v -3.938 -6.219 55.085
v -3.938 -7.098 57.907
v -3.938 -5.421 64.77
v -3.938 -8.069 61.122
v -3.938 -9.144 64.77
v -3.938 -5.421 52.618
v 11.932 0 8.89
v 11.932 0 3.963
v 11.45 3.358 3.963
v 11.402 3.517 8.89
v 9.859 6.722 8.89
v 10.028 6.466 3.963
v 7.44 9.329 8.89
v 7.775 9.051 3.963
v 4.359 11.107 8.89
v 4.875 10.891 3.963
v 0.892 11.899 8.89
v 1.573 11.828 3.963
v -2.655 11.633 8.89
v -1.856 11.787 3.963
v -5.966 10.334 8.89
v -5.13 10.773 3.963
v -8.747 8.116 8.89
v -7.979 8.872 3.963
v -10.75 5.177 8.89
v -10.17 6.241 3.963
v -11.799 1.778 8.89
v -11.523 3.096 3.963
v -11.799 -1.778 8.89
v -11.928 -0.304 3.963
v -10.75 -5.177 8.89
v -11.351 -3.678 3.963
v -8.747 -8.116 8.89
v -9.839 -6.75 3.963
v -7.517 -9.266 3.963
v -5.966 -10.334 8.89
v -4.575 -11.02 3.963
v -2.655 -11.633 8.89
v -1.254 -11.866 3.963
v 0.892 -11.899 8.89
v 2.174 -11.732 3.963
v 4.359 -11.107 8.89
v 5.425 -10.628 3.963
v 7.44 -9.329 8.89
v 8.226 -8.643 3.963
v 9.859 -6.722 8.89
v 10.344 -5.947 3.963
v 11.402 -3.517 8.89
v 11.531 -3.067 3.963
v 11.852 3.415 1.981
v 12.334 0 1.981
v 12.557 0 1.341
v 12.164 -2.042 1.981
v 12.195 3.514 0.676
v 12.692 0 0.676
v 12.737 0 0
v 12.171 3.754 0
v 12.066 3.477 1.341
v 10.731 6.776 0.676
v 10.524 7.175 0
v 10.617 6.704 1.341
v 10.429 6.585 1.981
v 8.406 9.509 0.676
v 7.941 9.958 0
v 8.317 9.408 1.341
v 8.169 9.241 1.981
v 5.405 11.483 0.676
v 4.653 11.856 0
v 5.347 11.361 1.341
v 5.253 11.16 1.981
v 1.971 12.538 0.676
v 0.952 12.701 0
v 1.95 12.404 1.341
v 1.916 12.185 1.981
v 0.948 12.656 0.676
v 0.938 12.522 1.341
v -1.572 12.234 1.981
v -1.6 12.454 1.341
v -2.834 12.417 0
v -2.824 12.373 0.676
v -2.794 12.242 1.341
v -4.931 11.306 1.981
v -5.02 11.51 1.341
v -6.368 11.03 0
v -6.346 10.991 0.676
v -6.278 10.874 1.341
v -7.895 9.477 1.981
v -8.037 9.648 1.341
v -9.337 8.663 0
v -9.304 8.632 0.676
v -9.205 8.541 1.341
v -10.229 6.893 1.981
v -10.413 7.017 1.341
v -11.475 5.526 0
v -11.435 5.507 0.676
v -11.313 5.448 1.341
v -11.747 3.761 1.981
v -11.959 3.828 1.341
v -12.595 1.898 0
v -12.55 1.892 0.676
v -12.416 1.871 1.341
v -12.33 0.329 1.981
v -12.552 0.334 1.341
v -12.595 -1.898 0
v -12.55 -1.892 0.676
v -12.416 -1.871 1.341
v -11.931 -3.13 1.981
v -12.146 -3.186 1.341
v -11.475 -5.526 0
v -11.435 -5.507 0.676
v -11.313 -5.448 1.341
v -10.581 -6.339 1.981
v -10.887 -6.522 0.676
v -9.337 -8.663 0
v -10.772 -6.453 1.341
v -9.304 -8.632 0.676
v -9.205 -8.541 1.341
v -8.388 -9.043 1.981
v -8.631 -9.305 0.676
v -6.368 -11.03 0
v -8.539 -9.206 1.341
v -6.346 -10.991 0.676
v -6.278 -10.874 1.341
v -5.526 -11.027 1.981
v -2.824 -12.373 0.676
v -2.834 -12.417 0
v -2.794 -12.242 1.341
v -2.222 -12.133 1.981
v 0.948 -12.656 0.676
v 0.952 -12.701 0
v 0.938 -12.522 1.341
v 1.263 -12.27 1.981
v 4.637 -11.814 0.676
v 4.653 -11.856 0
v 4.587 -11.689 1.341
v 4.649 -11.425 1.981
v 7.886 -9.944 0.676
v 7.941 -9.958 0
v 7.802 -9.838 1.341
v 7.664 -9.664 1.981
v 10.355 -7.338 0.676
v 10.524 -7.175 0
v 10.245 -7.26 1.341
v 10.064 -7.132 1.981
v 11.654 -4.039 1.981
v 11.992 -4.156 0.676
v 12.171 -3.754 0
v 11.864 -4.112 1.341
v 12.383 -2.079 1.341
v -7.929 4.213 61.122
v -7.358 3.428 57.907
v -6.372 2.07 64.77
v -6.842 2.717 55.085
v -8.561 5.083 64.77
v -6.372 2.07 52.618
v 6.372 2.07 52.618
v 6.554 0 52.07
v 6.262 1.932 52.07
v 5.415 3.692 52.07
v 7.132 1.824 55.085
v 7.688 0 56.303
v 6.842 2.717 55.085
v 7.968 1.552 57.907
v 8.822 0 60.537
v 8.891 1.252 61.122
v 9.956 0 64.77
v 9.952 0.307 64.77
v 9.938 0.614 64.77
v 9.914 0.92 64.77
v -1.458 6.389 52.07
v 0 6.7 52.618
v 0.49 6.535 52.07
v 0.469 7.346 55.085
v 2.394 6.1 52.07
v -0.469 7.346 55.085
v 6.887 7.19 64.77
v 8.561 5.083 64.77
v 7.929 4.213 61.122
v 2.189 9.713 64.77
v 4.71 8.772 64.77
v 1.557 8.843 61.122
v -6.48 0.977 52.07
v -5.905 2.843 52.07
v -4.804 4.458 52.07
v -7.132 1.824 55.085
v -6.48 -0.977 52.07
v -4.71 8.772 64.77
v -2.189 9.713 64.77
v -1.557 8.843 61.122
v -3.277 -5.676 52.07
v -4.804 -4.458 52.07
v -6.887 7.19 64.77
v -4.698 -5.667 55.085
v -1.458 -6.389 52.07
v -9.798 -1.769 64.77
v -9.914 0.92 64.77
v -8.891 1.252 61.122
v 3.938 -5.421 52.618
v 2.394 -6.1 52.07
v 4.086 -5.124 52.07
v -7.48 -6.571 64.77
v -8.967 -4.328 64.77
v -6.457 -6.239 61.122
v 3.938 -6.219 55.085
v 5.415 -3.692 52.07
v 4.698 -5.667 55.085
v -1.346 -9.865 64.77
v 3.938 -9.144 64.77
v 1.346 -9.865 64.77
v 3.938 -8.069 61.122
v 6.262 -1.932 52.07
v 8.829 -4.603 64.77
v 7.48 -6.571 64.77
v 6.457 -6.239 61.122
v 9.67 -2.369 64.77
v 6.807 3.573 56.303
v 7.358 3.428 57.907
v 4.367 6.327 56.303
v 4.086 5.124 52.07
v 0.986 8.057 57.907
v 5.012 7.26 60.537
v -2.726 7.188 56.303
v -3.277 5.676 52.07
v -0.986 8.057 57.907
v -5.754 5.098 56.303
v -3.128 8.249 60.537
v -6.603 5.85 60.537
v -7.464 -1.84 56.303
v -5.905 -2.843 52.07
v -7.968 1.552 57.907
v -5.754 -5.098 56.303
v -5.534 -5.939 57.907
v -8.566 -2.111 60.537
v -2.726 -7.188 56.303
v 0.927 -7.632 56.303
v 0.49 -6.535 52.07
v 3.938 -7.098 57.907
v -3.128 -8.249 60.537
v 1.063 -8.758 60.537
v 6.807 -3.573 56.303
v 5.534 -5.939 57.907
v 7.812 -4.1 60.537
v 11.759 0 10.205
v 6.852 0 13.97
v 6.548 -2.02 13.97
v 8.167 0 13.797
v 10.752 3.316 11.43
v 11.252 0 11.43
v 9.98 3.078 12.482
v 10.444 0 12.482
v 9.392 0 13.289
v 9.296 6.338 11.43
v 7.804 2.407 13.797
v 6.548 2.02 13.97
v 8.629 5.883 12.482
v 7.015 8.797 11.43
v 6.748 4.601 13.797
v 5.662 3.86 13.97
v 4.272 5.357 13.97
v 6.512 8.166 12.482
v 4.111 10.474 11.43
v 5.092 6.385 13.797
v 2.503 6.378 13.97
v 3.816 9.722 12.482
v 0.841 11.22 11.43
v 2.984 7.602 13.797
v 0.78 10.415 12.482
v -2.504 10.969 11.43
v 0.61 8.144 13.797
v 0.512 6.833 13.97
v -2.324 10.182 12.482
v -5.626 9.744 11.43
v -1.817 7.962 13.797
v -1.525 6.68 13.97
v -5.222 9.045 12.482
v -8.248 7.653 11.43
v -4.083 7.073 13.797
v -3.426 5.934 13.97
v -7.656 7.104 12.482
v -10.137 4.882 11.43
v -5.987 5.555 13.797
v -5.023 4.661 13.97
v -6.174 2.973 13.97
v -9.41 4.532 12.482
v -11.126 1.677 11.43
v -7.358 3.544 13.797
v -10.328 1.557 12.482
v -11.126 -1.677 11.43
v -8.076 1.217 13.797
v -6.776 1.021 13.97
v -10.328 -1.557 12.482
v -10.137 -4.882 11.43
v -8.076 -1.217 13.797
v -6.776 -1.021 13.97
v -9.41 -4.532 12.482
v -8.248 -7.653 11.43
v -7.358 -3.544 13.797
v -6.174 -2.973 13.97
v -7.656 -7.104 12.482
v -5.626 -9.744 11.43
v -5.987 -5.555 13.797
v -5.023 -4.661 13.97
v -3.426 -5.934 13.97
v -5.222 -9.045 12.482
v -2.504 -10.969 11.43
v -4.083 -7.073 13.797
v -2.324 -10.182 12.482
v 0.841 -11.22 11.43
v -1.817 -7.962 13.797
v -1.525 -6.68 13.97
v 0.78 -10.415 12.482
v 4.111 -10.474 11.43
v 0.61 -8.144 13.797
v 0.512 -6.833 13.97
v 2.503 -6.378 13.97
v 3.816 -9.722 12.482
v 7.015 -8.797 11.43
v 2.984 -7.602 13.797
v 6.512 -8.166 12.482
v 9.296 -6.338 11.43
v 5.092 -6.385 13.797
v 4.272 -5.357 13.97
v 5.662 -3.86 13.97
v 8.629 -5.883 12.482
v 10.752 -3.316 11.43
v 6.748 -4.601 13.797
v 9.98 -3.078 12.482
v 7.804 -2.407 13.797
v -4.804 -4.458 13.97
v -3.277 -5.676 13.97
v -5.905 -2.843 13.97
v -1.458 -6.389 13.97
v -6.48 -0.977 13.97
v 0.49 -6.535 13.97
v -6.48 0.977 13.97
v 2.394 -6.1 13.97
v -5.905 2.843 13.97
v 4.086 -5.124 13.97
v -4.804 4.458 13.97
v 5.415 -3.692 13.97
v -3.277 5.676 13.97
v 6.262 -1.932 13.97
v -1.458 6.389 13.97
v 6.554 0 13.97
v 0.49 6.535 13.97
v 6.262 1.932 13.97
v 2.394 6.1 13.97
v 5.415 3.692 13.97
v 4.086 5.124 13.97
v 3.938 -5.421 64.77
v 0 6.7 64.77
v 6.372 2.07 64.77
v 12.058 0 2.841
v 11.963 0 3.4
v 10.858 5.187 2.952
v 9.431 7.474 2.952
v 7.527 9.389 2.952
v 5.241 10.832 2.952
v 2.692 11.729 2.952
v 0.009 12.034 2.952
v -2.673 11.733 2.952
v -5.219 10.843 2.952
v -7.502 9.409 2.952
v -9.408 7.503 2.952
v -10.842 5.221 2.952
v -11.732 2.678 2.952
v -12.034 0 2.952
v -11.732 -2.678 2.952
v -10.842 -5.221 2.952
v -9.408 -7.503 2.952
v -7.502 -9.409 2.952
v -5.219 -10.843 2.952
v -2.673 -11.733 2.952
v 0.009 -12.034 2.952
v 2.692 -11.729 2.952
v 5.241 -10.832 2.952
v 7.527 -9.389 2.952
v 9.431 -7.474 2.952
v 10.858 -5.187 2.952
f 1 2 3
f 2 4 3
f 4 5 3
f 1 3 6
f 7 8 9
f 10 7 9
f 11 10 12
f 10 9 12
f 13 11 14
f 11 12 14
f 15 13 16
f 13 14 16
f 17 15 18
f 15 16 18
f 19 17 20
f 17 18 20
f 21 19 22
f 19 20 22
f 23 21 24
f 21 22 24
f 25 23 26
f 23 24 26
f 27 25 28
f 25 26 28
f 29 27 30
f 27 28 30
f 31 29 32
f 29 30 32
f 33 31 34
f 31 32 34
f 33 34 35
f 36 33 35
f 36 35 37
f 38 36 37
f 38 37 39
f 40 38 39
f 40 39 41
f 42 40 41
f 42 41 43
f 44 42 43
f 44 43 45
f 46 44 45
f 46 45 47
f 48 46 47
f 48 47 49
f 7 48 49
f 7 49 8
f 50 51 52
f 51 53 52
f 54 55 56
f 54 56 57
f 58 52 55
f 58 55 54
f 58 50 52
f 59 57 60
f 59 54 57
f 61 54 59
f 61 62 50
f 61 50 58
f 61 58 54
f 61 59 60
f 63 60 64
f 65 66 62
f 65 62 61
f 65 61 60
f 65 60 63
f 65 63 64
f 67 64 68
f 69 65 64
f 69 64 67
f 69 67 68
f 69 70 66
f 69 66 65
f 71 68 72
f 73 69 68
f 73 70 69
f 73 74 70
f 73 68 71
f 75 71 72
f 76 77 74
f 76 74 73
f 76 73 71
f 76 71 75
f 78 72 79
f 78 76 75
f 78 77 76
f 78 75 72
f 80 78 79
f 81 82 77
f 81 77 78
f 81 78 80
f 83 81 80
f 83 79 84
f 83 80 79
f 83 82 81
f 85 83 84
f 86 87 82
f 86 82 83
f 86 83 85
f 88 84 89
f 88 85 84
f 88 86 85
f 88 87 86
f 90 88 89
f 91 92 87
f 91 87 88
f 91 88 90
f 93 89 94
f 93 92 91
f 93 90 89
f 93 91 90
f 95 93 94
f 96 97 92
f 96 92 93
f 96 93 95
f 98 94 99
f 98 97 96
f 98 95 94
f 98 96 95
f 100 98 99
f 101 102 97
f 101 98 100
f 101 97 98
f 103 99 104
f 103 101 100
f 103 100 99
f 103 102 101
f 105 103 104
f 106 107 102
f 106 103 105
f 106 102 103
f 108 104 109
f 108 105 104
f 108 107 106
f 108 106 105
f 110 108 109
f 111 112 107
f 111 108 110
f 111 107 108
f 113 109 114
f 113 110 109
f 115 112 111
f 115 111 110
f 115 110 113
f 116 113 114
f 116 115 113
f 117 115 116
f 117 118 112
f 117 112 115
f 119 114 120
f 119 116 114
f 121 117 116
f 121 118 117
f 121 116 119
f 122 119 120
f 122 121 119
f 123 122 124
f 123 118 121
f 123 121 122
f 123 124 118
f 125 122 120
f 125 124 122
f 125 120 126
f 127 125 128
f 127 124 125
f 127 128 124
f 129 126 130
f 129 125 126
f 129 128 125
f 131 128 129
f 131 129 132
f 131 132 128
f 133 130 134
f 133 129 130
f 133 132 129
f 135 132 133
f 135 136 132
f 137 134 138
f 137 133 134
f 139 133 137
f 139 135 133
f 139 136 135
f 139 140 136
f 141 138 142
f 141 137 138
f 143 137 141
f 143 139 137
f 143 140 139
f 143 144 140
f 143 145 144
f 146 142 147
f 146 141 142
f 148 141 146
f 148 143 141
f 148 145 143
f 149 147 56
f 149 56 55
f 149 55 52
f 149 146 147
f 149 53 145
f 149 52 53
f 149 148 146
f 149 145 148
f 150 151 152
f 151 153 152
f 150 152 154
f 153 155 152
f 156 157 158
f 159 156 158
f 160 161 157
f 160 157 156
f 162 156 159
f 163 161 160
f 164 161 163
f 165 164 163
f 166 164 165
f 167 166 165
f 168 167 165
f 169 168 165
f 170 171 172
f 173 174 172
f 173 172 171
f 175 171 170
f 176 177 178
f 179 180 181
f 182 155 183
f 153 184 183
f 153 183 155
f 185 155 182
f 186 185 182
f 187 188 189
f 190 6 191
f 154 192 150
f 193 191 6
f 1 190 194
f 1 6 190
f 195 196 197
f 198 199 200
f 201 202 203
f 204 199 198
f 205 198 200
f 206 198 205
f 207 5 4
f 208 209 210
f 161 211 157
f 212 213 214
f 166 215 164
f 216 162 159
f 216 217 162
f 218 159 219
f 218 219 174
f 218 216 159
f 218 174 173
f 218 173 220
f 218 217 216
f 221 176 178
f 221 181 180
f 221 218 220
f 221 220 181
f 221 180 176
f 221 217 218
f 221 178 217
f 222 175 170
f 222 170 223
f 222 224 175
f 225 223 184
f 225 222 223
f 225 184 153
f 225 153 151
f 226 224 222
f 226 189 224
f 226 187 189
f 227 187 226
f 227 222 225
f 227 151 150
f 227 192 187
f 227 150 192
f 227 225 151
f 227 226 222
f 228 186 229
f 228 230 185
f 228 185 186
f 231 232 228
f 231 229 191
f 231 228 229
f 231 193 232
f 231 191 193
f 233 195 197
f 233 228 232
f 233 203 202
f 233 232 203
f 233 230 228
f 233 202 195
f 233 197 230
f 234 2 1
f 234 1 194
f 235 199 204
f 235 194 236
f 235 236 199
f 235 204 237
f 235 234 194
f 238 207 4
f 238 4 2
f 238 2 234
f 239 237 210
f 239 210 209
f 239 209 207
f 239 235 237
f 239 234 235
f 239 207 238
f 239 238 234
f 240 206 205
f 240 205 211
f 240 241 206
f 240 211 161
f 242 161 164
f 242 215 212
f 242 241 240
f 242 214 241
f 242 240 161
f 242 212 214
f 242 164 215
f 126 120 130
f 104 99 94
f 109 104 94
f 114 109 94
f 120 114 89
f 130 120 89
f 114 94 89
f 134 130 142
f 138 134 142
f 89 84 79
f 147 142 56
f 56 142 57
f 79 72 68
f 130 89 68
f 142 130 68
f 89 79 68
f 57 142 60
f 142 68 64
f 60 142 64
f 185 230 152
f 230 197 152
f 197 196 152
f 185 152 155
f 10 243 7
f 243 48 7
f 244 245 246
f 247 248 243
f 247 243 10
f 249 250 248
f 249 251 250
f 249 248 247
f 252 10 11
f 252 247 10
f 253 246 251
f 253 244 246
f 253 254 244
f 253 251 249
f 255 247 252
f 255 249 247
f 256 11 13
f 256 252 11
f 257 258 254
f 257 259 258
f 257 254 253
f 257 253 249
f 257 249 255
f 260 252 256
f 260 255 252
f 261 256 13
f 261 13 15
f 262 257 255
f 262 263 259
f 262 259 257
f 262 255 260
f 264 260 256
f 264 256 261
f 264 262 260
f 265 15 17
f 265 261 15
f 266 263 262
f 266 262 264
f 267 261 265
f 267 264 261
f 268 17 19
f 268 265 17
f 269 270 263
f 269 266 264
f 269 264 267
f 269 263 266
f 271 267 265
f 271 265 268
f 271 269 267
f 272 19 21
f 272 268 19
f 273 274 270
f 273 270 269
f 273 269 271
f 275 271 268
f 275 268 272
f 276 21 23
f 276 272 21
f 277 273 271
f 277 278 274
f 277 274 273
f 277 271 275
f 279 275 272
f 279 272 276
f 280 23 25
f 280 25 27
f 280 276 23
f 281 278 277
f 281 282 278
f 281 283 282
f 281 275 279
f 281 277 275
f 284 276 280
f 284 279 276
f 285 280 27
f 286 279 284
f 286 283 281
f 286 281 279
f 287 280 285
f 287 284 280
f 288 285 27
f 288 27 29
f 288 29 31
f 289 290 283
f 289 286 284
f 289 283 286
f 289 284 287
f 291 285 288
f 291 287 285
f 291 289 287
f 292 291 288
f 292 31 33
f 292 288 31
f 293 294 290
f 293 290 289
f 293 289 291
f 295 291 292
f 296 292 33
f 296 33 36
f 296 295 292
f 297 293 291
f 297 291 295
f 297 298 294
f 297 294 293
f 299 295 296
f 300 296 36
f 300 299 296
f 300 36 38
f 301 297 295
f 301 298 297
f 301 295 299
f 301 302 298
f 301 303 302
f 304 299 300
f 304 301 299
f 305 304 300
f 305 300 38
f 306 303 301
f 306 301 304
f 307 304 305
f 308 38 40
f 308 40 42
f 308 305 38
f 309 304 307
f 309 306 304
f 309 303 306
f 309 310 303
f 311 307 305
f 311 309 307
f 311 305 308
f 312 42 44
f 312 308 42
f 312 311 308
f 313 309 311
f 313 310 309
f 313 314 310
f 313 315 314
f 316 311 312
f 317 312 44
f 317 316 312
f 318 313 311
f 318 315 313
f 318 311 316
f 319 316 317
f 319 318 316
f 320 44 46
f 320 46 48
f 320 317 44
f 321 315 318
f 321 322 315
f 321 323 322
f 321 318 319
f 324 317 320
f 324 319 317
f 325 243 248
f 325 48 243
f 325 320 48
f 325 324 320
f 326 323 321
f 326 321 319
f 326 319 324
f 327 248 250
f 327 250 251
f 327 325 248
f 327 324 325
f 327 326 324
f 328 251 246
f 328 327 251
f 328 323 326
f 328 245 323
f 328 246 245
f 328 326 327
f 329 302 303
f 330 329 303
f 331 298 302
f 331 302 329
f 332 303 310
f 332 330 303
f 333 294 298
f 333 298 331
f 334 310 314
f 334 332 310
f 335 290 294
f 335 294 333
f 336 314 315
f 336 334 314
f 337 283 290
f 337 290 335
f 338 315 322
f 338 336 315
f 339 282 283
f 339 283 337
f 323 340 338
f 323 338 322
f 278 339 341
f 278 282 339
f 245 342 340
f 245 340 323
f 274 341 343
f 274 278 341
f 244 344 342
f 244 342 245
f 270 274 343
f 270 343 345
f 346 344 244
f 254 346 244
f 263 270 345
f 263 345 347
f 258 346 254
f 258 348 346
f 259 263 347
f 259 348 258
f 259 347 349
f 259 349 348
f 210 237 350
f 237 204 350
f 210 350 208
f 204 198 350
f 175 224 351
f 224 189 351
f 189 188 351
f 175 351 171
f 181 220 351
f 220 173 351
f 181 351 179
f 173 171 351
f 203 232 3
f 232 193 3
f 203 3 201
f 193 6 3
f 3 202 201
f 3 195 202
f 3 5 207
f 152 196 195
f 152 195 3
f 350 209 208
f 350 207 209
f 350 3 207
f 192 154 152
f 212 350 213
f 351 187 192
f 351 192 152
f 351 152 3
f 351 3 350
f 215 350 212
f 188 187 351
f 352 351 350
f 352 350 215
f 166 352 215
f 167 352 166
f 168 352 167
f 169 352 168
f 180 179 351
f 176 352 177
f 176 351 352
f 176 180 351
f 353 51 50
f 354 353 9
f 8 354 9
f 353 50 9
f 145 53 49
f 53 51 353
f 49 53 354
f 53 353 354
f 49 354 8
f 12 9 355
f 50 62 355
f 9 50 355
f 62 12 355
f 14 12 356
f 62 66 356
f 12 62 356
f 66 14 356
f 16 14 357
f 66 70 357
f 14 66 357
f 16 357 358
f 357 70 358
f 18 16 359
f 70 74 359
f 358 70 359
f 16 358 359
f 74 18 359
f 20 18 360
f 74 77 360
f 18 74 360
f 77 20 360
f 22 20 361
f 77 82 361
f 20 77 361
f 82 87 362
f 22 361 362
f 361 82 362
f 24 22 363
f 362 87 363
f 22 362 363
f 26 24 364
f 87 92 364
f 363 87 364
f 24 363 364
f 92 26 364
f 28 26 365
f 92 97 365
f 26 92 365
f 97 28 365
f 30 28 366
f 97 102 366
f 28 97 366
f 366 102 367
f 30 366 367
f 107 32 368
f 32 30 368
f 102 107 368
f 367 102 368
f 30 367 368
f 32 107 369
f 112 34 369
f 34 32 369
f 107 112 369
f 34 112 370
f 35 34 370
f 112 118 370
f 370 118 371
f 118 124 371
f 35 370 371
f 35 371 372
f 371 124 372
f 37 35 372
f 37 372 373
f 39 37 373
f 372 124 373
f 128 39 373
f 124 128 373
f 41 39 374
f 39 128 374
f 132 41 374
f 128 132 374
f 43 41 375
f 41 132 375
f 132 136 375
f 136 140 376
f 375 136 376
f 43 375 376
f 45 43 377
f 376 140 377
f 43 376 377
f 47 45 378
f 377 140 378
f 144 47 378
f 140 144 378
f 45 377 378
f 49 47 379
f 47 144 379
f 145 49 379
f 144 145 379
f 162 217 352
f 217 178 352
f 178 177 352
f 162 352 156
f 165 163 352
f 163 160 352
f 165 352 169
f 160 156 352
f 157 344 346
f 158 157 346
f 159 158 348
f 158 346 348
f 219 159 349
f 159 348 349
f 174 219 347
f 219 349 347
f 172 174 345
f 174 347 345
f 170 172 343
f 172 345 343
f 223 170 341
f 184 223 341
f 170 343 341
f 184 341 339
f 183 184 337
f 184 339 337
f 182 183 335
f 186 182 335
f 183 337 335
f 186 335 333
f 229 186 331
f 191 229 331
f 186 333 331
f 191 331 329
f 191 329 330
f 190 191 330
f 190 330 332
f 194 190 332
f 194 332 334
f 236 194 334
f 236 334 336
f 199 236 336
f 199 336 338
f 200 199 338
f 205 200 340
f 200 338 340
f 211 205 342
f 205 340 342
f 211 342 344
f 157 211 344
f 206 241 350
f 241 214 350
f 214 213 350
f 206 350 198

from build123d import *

# Parameters (mm, degrees)
F0_R      = 12.7368274584
F1_DEPTH  = 5.08
F2_R      = 5.07999
F3_R      = 11.9321398377
F4_DEPTH  = 13.97
F5_R      = 5.08
F6_R      = 6.5535099449
F7_DEPTH  = 24.13
F8_DEPTH  = 27.94
F8_FACE_R = 6.5535099449
F9_DEPTH  = 12.7
F9_TAPER  = -15
F11_DEPTH = 25.4


# Not quite as in the source:
# - a fillet or chamfer is up to 0.001 mm smaller than in the source, because OpenCascade refuses the exact size


with BuildPart() as f1:
    # F0 (on Top) → F1 (new body)
    with BuildSketch(Plane.XY):
        Circle(F0_R)
    extrude(amount=F1_DEPTH)

    # F2 (radius 5.08 in the source; OpenCascade refuses exactly that, so slightly less here)
    f2_edges = [f1.edges().sort_by_distance(p)[0] for p in [
        (-12.736827, 0, 5.08),
    ]]
    fillet(f2_edges, radius=F2_R)

    # F3 (on Top) → F4 (join)
    with BuildSketch(Plane.XY):
        Circle(F3_R)
    extrude(amount=F4_DEPTH)

    # F5
    f5_edges = [f1.edges().sort_by_distance(p)[0] for p in [
        (-11.93214, 0, 2.743746),
        (11.93214, 0, 8.356873),
        (-11.93214, 0, 13.97),
    ]]
    fillet(f5_edges, radius=F5_R)

    # F6 (on Top) → F7 (join)
    with BuildSketch(Plane.XY):
        Circle(F6_R)
    extrude(amount=F7_DEPTH)

    # F8 (add): a face of the model
    f8_faces = [f1.faces().sort_by_distance(p)[0] for p in [
        (0, 0, 24.13),
    ]]
    extrude(f8_faces, amount=F8_DEPTH)

    # F8_face (on face) → F9 (join)
    with BuildSketch(Plane.XY.offset(52.07)):
        Circle(F8_FACE_R)
    extrude(amount=F9_DEPTH, taper=F9_TAPER)

    # F10 (on face) → F11 (cut)
    with BuildSketch(Plane.XY.offset(64.77)):
        with BuildLine():
            Line((3.9382930845, -5.420595399), (3.9382930845, -9.1444538754))
            ThreePointArc((3.9382930845, -9.1444538754), (5.852263109, -8.0549491371), (7.4798929542, -6.5713309529))
            Line((7.4798929542, -6.5713309529), (3.9382930845, -5.420595399))
        make_face()
        with BuildLine():
            Line((8.5611211624, 5.0831479952), (6.3722920684, 2.0704832032))
            Line((6.3722920684, 2.0704832032), (9.9138919381, 0.9197476493))
            ThreePointArc((9.9138919381, 0.9197476493), (9.4691606215, 3.0767167927), (8.5611211624, 5.0831479952))
        make_face()
        with BuildLine():
            Line((-2.188829094, 9.7128891837), (0, 6.7002243917))
            Line((0, 6.7002243917), (2.188829094, 9.7128891837))
            ThreePointArc((2.188829094, 9.7128891837), (0, 9.9564646887), (-2.188829094, 9.7128891837))
        make_face()
        with BuildLine():
            ThreePointArc((-8.5611211624, 5.0831479952), (-9.4691606215, 3.0767167927), (-9.9138919381, 0.9197476493))
            Line((-9.9138919381, 0.9197476493), (-6.3722920684, 2.0704832032))
            Line((-6.3722920684, 2.0704832032), (-8.5611211624, 5.0831479952))
        make_face()
        with BuildLine():
            ThreePointArc((-7.4798929542, -6.5713309529), (-5.852263109, -8.0549491371), (-3.9382930845, -9.1444538754))
            Line((-3.9382930845, -9.1444538754), (-3.9382930845, -5.420595399))
            Line((-3.9382930845, -5.420595399), (-7.4798929542, -6.5713309529))
        make_face()
    extrude(amount=-F11_DEPTH, mode=Mode.SUBTRACT)


solid = f1.part
